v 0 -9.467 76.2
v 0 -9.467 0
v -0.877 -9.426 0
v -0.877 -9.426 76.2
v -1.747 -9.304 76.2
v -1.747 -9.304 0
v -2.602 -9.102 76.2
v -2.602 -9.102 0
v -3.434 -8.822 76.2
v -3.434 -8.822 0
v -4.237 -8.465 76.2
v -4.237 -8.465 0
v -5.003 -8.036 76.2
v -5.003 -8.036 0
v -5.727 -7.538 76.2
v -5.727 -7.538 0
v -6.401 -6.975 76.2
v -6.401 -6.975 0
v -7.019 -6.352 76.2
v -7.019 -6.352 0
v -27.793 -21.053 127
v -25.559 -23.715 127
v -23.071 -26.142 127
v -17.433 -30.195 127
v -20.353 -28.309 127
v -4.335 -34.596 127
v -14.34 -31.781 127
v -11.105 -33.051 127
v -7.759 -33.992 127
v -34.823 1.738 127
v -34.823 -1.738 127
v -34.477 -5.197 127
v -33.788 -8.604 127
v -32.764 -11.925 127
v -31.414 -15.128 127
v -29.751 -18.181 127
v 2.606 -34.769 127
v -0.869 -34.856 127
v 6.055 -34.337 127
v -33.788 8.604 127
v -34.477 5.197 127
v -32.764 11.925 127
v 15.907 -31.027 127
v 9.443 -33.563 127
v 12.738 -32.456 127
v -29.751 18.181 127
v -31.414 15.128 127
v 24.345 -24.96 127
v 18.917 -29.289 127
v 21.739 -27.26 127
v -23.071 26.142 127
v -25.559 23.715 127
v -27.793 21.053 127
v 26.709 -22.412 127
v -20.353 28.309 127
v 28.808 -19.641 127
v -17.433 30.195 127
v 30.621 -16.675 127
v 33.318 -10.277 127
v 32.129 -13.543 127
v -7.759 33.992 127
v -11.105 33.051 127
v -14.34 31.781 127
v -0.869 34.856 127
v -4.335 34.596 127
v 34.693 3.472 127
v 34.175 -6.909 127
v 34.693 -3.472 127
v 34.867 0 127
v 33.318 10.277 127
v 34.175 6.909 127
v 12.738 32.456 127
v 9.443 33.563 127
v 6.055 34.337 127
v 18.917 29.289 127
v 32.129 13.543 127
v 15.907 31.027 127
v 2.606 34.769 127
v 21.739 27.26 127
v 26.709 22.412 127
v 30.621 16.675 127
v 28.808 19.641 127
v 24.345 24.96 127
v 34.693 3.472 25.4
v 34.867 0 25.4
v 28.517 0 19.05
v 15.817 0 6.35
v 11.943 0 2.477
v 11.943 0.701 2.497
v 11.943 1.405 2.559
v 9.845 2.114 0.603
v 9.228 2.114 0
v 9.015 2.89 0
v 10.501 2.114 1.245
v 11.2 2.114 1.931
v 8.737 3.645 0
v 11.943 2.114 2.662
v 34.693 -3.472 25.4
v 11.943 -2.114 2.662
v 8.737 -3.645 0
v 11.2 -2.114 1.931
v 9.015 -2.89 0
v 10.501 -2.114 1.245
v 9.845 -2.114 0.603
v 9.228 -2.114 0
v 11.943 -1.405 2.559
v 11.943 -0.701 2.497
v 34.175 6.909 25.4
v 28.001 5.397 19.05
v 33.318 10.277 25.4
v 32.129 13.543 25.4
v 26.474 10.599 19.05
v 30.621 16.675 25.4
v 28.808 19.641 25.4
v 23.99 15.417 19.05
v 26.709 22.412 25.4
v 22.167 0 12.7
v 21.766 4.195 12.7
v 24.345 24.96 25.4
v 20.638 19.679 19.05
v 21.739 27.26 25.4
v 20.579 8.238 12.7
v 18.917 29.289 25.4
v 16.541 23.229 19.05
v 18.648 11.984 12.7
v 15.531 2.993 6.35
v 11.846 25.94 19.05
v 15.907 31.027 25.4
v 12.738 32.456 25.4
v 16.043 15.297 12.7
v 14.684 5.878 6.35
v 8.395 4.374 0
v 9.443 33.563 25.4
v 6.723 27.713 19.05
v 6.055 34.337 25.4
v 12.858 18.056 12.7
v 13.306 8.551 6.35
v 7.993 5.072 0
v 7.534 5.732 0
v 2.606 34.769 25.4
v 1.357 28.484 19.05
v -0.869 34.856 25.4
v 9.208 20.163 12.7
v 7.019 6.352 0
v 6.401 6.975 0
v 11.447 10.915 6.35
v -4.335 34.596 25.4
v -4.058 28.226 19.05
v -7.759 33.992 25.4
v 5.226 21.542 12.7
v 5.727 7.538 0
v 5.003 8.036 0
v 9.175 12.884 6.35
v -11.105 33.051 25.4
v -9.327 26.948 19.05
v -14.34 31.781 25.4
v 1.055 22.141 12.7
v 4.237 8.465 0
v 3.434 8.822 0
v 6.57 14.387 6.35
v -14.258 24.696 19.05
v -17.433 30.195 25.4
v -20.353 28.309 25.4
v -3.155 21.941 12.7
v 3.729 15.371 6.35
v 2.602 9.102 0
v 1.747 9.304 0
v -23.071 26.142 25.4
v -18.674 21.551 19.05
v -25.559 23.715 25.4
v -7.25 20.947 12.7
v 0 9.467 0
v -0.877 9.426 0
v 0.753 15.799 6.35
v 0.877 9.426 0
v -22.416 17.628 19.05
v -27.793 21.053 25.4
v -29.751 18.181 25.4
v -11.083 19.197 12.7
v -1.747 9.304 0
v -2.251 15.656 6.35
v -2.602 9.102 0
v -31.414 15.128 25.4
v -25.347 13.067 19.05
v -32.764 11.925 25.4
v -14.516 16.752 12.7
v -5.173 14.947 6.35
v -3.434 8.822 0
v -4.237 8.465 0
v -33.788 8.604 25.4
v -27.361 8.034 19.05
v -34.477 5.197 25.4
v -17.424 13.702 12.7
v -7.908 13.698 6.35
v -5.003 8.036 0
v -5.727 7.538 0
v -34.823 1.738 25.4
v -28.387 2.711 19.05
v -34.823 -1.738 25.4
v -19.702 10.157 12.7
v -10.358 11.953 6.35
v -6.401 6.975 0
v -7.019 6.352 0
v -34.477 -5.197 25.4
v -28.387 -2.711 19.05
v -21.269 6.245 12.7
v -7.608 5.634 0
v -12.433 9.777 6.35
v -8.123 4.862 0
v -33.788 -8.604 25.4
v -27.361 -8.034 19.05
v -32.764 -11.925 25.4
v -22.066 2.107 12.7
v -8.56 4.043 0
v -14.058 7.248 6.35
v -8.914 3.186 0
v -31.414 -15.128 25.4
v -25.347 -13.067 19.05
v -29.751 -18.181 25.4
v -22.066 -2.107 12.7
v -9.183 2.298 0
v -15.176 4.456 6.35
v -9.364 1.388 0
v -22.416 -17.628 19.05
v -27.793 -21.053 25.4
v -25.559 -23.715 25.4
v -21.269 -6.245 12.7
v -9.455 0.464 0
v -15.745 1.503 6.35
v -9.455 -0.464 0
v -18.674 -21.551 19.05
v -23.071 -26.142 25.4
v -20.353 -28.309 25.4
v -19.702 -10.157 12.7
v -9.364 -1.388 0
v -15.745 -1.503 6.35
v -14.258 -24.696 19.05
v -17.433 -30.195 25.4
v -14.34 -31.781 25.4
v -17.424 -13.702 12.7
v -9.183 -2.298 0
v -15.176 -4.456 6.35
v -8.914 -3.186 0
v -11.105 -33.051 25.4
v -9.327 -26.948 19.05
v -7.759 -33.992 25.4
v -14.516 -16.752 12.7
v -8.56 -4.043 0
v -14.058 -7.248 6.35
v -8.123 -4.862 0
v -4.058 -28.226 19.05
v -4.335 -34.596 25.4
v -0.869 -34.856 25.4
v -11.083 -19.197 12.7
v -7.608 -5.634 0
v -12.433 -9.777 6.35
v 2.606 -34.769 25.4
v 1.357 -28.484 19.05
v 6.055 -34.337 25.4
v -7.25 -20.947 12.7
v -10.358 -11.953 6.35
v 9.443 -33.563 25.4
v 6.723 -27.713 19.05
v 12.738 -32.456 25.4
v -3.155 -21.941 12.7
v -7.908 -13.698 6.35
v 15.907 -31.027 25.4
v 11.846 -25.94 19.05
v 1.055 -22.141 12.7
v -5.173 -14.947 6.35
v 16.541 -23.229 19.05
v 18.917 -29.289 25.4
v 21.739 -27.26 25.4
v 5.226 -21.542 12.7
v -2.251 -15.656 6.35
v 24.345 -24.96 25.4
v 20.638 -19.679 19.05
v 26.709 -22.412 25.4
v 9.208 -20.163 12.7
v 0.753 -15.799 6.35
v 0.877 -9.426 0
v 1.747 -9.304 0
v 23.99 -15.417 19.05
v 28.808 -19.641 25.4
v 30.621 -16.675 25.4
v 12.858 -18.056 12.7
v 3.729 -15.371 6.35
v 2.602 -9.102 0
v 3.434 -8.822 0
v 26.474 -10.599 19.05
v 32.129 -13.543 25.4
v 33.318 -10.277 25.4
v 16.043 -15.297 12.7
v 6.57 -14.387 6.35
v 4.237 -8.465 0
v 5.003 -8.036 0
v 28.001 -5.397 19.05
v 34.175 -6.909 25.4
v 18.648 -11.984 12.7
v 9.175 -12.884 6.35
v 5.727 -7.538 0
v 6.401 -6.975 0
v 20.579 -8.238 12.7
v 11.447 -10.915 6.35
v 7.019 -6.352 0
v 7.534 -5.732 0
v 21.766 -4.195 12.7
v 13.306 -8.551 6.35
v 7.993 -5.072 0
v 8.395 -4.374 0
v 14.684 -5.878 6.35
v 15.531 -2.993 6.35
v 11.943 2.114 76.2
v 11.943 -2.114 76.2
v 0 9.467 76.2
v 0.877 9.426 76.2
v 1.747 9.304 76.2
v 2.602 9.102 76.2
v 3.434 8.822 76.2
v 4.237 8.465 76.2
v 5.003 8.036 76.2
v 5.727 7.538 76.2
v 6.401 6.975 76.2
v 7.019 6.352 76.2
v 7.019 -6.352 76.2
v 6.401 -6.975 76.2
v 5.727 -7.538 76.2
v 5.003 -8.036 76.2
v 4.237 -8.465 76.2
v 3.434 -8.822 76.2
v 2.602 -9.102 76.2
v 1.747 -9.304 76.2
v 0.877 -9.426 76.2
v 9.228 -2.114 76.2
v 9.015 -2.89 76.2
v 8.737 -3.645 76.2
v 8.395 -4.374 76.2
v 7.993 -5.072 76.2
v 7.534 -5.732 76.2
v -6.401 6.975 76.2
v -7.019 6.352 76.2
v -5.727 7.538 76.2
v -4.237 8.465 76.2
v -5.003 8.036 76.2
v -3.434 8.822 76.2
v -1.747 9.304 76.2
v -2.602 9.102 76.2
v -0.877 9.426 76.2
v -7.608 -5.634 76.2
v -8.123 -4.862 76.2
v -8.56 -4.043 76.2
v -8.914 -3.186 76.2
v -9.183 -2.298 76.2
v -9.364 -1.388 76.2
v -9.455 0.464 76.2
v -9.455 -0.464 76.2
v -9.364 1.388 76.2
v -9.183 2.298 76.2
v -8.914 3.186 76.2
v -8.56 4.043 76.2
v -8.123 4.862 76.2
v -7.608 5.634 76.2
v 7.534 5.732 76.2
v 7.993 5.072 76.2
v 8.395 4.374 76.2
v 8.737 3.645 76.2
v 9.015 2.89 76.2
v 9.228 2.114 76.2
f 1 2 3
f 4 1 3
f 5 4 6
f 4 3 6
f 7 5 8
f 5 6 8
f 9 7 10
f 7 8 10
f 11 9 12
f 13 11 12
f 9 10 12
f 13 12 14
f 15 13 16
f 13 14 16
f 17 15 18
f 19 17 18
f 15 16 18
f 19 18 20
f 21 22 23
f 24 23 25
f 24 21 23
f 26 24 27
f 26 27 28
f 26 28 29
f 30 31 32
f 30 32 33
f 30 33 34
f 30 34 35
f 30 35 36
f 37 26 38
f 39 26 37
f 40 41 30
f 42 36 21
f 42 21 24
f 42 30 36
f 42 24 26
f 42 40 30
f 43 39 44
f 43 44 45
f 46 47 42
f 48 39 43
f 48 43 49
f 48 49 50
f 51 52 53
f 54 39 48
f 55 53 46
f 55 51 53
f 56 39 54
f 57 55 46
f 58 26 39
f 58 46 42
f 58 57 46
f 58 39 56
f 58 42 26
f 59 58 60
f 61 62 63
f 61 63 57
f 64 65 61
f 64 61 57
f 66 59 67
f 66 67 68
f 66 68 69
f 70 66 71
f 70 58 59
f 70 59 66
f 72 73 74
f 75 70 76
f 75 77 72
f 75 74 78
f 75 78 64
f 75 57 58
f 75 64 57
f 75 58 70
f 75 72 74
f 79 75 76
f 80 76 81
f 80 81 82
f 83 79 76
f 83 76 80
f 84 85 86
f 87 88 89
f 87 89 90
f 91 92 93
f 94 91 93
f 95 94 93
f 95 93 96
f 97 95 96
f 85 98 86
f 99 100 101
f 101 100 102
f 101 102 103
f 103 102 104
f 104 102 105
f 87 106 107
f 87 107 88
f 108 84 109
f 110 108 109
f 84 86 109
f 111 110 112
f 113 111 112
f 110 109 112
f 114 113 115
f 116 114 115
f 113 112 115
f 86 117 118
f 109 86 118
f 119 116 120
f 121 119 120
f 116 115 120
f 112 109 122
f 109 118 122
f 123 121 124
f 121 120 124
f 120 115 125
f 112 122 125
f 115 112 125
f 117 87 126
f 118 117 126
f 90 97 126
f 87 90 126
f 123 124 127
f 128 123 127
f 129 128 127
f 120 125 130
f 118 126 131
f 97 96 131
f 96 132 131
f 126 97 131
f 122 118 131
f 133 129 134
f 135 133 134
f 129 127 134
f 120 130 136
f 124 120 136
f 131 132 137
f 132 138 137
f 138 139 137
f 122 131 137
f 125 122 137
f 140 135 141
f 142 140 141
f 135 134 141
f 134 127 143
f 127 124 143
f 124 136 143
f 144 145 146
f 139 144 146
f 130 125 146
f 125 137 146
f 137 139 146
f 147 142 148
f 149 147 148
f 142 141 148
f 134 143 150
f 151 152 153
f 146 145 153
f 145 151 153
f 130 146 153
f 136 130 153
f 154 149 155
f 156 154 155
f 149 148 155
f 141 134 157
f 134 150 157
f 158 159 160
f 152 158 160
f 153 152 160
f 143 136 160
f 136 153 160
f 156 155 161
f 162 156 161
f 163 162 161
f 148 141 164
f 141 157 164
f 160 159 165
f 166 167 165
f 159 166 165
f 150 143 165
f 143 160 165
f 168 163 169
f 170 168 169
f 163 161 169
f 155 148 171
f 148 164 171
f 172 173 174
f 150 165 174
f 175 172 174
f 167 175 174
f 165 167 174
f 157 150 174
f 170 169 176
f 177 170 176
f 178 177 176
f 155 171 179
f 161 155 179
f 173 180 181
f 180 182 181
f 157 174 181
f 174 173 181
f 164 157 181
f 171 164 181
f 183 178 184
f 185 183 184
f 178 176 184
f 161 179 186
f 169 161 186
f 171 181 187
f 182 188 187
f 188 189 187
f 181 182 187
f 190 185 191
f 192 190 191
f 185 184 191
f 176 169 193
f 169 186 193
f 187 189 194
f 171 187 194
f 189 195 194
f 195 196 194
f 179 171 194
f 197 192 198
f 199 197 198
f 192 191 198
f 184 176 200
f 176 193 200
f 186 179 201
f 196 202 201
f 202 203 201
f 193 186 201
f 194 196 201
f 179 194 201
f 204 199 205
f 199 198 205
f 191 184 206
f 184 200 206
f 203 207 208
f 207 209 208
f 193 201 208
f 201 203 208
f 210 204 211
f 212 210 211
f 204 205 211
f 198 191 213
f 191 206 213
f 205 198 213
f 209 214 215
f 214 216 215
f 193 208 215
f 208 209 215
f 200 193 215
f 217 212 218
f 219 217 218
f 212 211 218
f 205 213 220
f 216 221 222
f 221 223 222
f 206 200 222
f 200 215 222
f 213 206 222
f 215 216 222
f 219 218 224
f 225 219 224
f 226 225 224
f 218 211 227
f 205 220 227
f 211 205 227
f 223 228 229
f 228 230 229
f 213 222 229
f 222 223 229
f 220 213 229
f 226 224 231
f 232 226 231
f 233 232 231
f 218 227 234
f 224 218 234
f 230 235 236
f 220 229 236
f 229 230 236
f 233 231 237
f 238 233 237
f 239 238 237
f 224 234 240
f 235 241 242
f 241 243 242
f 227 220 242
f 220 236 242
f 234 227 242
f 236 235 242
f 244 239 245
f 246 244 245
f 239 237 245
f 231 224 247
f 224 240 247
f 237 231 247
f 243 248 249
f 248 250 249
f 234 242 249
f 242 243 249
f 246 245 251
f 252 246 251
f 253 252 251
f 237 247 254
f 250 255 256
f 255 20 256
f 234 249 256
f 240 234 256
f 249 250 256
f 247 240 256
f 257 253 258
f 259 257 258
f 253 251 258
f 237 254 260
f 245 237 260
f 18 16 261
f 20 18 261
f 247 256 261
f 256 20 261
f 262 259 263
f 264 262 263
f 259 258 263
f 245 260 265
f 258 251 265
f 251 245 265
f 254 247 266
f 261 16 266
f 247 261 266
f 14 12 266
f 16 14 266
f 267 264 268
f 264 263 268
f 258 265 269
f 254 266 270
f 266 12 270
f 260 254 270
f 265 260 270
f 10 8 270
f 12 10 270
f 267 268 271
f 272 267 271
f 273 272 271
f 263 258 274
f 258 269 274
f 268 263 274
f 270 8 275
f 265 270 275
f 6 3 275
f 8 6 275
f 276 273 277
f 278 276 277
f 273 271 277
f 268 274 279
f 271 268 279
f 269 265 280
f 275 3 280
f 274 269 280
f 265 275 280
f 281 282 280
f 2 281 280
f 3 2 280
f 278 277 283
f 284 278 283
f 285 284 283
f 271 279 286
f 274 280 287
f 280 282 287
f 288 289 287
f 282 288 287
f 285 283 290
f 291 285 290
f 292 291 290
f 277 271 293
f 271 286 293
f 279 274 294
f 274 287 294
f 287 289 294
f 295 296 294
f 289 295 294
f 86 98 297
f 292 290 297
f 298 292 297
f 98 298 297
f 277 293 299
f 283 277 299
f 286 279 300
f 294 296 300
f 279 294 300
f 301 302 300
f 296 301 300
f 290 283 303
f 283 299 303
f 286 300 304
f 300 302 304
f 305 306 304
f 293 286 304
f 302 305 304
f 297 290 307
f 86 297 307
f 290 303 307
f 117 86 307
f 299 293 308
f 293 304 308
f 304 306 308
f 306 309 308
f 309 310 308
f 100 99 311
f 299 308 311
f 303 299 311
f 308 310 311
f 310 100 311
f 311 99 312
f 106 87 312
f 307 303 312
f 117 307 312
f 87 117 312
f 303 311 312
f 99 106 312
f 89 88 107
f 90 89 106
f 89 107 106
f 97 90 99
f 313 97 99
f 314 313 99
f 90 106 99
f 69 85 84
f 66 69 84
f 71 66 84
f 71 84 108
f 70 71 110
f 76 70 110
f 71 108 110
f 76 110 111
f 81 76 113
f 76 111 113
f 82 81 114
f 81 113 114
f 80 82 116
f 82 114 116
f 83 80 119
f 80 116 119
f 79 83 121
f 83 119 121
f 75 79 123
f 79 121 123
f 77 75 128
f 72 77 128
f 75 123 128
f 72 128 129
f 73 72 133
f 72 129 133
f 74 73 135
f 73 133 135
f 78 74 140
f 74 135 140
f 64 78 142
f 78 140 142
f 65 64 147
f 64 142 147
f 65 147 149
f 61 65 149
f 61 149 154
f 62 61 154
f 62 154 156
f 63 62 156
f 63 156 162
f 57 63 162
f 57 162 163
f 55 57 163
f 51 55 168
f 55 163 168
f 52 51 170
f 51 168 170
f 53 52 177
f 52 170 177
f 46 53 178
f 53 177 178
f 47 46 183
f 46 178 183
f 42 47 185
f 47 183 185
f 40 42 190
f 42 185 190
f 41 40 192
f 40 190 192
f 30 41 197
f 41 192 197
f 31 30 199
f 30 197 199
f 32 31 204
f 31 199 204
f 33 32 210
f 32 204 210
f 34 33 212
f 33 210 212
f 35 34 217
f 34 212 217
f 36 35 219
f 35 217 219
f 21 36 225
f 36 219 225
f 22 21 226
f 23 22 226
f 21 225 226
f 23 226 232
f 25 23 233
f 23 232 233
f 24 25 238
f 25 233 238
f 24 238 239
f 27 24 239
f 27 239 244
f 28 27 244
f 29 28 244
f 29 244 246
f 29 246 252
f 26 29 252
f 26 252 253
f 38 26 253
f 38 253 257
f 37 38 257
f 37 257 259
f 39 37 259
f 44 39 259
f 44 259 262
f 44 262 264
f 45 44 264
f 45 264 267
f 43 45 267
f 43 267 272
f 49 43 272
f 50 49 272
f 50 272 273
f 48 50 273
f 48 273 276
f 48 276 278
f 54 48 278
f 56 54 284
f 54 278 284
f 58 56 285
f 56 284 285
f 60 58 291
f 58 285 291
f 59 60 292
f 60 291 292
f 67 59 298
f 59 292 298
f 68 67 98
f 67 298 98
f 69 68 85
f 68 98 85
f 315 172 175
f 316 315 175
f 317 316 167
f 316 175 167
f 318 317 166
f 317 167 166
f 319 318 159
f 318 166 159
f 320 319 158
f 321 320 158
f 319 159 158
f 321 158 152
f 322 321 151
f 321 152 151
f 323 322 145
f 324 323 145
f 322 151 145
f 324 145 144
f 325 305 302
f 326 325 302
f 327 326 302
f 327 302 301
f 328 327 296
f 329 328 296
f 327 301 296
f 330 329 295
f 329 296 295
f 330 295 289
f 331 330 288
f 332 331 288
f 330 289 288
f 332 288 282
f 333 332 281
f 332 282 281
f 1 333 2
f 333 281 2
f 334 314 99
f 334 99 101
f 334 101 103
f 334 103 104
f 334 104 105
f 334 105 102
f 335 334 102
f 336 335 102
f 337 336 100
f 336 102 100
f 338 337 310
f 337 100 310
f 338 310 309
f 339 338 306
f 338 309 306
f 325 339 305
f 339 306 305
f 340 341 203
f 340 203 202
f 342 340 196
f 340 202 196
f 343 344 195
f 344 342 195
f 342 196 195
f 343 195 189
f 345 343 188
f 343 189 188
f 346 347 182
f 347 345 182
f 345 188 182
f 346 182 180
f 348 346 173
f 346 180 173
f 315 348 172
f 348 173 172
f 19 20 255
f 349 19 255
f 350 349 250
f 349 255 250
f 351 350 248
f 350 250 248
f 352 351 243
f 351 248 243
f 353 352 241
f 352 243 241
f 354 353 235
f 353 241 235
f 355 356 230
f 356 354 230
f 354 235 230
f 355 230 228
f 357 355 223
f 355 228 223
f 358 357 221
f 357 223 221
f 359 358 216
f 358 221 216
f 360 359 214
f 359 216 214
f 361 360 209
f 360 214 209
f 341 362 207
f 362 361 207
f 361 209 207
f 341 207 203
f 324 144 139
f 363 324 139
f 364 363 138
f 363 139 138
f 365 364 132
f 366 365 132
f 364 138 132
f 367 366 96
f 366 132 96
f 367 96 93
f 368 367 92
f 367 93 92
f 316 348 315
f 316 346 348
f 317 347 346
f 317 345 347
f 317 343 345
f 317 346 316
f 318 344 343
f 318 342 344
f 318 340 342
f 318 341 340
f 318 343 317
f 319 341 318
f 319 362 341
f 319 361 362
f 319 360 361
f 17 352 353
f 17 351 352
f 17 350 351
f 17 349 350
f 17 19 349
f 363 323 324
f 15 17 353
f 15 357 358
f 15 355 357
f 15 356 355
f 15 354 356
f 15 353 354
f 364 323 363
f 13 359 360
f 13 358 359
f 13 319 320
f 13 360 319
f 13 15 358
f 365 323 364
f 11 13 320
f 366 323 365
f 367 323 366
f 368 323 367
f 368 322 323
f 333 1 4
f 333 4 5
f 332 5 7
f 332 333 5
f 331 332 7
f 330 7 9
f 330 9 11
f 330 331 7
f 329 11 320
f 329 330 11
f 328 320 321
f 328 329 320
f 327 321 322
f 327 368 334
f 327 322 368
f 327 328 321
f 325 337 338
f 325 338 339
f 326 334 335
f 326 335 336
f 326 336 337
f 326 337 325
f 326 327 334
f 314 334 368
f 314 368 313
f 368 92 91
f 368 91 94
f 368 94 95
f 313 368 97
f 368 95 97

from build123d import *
from build123d import SkipClean  # not in build123d's __all__

# Parameters (mm, degrees)
F0_R       = 34.8665776849
F1_DEPTH   = 127
F2_SIZE    = 25.4
F3_W       = 0.0296507081
F3_H       = 2.1137676667
F3_W_2     = 1.5040034195
F3_H_2     = 6.3516600603
F3_W_3     = 5.515434417
F1_FACE_R  = 9.4665776849
F1_FACE1_R = 34.8665776849
F4_DEPTH   = 76.2


with BuildPart() as f1:
    # F0 (on Top) → F1 (new body)
    with BuildSketch(Plane.XY):
        Circle(F0_R)
    extrude(amount=F1_DEPTH)

    # F2
    f2_edges = [f1.edges().sort_by_distance(p)[0] for p in [
        (-34.866578, 0, 0),
    ]]
    chamfer(f2_edges, length=F2_SIZE)

    # F3 (on face) + F1_face (on face) + F1_face1 (on face) → F4 (cut)
    with BuildSketch(Plane(origin=(0, 0, 0), x_dir=(1, 0, 0), z_dir=(0, 0, -1))):
        with Locations((7.0046124826, 1.0568838334)):
            Rectangle(F3_W, F3_H)
        with Locations((7.0046124826, -1.0568838334)):
            Rectangle(F3_W, F3_H)
        with Locations((0.7520017098, -3.1758300302)):
            Rectangle(F3_W_2, F3_H_2)
        with BuildLine():
            Line((7.0194378366, 2.1137676667), (7.0194378366, 0))
            Line((7.0194378366, 0), (9.4665776849, 0))
            ThreePointArc((9.4665776849, 0), (9.4066364158, 1.0636185423), (9.2275716911, 2.1137676667))
            Line((9.2275716911, 2.1137676667), (7.0194378366, 2.1137676667))
        make_face()
        with BuildLine():
            Line((7.0194378366, 0), (7.0194378366, -2.1137676667))
            Line((7.0194378366, -2.1137676667), (9.2275716911, -2.1137676667))
            ThreePointArc((9.2275716911, -2.1137676667), (9.4066364158, -1.0636185423), (9.4665776849, 0))
            Line((9.4665776849, 0), (7.0194378366, 0))
        make_face()
        with BuildLine():
            ThreePointArc((9.4665776849, 0), (9.4066364158, -1.0636185423), (9.2275716911, -2.1137676667))
            Line((9.2275716911, -2.1137676667), (11.9433682412, -2.1137676667))
            Line((11.9433682412, -2.1137676667), (11.9433682412, 2.1137676667))
            Line((11.9433682412, 2.1137676667), (9.2275716911, 2.1137676667))
            ThreePointArc((9.2275716911, 2.1137676667), (9.4066364158, 1.0636185423), (9.4665776849, 0))
        make_face()
        with Locations((-4.2617206281, 3.1758300302)):
            Rectangle(F3_W_3, F3_H_2)
        with Locations((-4.2617206281, -3.1758300302)):
            Rectangle(F3_W_3, F3_H_2)
        Polygon((1.5040034195, -6.3516600603), (7.0194378366, -6.3516600603), (7.0194378366, -2.1137676667), (6.9897871285, -2.1137676667), (6.9897871285, 0), (1.5040034195, 0), align=None)
        Polygon((1.5040034195, 6.3516600603), (1.5040034195, 0), (6.9897871285, 0), (6.9897871285, 2.1137676667), (7.0194378366, 2.1137676667), (7.0194378366, 6.3516600603), align=None)
        with Locations((0.7520017098, 3.1758300302)):
            Rectangle(F3_W_2, F3_H_2)
        with Locations((-0.7520017098, 3.1758300302)):
            Rectangle(F3_W_2, F3_H_2)
        with BuildLine():
            Line((-1.5040034195, 6.3516600603), (0, 6.3516600603))
            Line((0, 6.3516600603), (0, 9.4665776849))
            ThreePointArc((0, 9.4665776849), (-3.8397662477, 8.6528774535), (-7.0194378366, 6.3516600603))
            Line((-7.0194378366, 6.3516600603), (-1.5040034195, 6.3516600603))
        make_face()
        with Locations((-0.7520017098, -3.1758300302)):
            Rectangle(F3_W_2, F3_H_2)
        with BuildLine():
            Line((0, 9.4665776849), (0, 6.3516600603))
            Line((0, 6.3516600603), (1.5040034195, 6.3516600603))
            Line((1.5040034195, 6.3516600603), (7.0194378366, 6.3516600603))
            ThreePointArc((7.0194378366, 6.3516600603), (3.8397662477, 8.6528774535), (0, 9.4665776849))
        make_face()
        with BuildLine():
            Line((0, -6.3516600603), (0, -9.4665776849))
            ThreePointArc((0, -9.4665776849), (3.8397662477, -8.6528774535), (7.0194378366, -6.3516600603))
            Line((7.0194378366, -6.3516600603), (1.5040034195, -6.3516600603))
            Line((1.5040034195, -6.3516600603), (0, -6.3516600603))
        make_face()
    with BuildSketch(Plane(origin=(0, 0, 0), x_dir=(1, 0, 0), z_dir=(0, 0, -1))):
        Circle(F1_FACE_R)
    with BuildSketch(Plane.XY.offset(127)):
        Circle(F1_FACE1_R)
    extrude(amount=-F4_DEPTH, dir=(0, 0, -1), mode=Mode.SUBTRACT)

    # F5: F1 across plane


with BuildPart() as f1_1:
    add(f1.part, clean=False)
    with SkipClean():  # cleaning this boolean's faces spoils the solid; the shape is the same uncleaned
        add(f1.part.mirror(Plane.XZ), clean=False)


solid = f1_1.part
